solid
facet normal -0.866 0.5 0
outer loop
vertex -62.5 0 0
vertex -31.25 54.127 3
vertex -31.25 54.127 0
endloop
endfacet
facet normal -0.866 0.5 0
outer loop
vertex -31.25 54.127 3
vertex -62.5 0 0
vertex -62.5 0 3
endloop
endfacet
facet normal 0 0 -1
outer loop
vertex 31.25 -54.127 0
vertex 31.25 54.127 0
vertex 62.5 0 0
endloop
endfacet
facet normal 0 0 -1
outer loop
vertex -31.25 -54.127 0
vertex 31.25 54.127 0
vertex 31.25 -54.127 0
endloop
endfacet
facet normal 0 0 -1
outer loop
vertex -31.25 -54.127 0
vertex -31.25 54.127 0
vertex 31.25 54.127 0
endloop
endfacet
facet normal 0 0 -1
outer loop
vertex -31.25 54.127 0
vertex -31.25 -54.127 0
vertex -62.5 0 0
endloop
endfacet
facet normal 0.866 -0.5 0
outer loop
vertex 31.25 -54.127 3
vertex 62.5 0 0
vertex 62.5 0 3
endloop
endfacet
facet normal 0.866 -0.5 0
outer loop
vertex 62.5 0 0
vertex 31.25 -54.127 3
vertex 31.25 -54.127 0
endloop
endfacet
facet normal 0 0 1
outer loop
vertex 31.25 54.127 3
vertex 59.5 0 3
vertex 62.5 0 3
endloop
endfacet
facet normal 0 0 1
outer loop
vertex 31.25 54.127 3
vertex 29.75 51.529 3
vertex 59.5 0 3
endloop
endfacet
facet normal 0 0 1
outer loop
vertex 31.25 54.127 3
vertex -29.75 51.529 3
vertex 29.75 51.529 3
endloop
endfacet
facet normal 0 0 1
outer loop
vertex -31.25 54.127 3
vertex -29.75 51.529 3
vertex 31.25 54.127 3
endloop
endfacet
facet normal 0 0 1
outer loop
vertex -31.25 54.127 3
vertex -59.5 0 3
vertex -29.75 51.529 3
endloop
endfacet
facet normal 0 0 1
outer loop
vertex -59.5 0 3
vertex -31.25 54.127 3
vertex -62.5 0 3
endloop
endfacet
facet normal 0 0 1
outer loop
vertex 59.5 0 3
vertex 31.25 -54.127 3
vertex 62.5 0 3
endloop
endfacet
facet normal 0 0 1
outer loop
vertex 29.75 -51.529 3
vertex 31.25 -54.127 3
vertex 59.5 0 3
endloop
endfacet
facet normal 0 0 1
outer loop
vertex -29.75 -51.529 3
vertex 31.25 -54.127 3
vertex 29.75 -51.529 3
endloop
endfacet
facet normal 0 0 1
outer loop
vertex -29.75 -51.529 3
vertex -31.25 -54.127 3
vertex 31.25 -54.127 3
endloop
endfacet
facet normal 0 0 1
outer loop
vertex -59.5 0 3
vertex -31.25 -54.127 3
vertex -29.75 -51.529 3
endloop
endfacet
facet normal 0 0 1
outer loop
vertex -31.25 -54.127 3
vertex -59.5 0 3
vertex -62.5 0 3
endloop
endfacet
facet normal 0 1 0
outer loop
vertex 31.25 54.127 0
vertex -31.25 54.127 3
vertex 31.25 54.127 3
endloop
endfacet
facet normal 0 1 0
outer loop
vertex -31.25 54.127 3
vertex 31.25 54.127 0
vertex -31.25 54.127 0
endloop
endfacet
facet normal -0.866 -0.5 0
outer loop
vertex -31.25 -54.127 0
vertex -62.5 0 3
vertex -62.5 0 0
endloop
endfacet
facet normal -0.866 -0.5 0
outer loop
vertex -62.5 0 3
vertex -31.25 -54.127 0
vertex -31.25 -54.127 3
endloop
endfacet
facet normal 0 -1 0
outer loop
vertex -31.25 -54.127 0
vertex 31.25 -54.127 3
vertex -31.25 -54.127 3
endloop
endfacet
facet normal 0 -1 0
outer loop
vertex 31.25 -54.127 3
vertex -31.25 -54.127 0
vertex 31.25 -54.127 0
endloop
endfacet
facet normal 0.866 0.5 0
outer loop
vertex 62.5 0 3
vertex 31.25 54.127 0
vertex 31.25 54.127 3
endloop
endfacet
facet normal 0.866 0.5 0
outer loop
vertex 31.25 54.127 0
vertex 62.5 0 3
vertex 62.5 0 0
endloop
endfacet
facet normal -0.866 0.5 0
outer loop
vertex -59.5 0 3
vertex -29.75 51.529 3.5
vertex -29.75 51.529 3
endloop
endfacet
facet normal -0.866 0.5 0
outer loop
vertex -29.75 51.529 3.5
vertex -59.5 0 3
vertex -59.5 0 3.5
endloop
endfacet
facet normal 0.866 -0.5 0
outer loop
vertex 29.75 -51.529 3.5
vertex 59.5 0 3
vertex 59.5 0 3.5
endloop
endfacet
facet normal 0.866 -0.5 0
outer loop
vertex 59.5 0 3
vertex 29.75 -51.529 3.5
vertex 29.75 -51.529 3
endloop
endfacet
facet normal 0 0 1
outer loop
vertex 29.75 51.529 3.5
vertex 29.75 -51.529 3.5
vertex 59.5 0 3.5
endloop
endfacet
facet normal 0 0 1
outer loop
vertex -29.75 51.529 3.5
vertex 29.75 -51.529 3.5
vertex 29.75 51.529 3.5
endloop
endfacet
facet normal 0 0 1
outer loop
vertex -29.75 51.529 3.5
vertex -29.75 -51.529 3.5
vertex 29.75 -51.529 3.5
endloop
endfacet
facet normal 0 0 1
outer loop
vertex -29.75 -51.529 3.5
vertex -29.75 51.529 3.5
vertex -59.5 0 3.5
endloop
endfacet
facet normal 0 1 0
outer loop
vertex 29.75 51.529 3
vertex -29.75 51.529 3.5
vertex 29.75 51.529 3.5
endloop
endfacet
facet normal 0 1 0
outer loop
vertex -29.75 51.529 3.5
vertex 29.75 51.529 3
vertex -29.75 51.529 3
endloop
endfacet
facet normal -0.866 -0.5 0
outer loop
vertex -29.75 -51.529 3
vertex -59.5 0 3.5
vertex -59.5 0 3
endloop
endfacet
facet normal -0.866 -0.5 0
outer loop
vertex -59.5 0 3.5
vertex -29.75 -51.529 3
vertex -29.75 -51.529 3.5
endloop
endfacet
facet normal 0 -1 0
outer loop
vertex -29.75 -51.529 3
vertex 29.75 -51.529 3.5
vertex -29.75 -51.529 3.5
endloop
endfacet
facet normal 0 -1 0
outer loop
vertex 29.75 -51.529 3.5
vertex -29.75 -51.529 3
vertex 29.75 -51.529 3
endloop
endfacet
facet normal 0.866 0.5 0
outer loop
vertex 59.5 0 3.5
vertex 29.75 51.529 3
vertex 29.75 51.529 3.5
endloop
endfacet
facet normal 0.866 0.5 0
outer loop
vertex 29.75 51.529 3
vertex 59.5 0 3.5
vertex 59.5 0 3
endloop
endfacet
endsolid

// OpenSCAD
// file: config.scad
HEX_WIDTH= 125;
HEX_BORDER = 7;
HEX_HEIGHT = 38;
HEX_ARM = HEX_WIDTH / 6;
SHIELD_THICKNESS = 3;
SHIELD_DIFFUSER_PADDING = 2;

SNAPFIT_DEPTH = 12.5;
SNAPFIT_HEIGHT = 7.5;
// main file
include <config.scad>;
$fn = 6;
tol = 0;

SHIELD_THICKNESS = 3;
SHIELD_DIFFUSER_PADDING = .5;

linear_extrude(SHIELD_THICKNESS)
circle(d=HEX_WIDTH+tol);

linear_extrude(SHIELD_THICKNESS + SHIELD_DIFFUSER_PADDING)
circle(d=HEX_WIDTH - 6 + tol);
